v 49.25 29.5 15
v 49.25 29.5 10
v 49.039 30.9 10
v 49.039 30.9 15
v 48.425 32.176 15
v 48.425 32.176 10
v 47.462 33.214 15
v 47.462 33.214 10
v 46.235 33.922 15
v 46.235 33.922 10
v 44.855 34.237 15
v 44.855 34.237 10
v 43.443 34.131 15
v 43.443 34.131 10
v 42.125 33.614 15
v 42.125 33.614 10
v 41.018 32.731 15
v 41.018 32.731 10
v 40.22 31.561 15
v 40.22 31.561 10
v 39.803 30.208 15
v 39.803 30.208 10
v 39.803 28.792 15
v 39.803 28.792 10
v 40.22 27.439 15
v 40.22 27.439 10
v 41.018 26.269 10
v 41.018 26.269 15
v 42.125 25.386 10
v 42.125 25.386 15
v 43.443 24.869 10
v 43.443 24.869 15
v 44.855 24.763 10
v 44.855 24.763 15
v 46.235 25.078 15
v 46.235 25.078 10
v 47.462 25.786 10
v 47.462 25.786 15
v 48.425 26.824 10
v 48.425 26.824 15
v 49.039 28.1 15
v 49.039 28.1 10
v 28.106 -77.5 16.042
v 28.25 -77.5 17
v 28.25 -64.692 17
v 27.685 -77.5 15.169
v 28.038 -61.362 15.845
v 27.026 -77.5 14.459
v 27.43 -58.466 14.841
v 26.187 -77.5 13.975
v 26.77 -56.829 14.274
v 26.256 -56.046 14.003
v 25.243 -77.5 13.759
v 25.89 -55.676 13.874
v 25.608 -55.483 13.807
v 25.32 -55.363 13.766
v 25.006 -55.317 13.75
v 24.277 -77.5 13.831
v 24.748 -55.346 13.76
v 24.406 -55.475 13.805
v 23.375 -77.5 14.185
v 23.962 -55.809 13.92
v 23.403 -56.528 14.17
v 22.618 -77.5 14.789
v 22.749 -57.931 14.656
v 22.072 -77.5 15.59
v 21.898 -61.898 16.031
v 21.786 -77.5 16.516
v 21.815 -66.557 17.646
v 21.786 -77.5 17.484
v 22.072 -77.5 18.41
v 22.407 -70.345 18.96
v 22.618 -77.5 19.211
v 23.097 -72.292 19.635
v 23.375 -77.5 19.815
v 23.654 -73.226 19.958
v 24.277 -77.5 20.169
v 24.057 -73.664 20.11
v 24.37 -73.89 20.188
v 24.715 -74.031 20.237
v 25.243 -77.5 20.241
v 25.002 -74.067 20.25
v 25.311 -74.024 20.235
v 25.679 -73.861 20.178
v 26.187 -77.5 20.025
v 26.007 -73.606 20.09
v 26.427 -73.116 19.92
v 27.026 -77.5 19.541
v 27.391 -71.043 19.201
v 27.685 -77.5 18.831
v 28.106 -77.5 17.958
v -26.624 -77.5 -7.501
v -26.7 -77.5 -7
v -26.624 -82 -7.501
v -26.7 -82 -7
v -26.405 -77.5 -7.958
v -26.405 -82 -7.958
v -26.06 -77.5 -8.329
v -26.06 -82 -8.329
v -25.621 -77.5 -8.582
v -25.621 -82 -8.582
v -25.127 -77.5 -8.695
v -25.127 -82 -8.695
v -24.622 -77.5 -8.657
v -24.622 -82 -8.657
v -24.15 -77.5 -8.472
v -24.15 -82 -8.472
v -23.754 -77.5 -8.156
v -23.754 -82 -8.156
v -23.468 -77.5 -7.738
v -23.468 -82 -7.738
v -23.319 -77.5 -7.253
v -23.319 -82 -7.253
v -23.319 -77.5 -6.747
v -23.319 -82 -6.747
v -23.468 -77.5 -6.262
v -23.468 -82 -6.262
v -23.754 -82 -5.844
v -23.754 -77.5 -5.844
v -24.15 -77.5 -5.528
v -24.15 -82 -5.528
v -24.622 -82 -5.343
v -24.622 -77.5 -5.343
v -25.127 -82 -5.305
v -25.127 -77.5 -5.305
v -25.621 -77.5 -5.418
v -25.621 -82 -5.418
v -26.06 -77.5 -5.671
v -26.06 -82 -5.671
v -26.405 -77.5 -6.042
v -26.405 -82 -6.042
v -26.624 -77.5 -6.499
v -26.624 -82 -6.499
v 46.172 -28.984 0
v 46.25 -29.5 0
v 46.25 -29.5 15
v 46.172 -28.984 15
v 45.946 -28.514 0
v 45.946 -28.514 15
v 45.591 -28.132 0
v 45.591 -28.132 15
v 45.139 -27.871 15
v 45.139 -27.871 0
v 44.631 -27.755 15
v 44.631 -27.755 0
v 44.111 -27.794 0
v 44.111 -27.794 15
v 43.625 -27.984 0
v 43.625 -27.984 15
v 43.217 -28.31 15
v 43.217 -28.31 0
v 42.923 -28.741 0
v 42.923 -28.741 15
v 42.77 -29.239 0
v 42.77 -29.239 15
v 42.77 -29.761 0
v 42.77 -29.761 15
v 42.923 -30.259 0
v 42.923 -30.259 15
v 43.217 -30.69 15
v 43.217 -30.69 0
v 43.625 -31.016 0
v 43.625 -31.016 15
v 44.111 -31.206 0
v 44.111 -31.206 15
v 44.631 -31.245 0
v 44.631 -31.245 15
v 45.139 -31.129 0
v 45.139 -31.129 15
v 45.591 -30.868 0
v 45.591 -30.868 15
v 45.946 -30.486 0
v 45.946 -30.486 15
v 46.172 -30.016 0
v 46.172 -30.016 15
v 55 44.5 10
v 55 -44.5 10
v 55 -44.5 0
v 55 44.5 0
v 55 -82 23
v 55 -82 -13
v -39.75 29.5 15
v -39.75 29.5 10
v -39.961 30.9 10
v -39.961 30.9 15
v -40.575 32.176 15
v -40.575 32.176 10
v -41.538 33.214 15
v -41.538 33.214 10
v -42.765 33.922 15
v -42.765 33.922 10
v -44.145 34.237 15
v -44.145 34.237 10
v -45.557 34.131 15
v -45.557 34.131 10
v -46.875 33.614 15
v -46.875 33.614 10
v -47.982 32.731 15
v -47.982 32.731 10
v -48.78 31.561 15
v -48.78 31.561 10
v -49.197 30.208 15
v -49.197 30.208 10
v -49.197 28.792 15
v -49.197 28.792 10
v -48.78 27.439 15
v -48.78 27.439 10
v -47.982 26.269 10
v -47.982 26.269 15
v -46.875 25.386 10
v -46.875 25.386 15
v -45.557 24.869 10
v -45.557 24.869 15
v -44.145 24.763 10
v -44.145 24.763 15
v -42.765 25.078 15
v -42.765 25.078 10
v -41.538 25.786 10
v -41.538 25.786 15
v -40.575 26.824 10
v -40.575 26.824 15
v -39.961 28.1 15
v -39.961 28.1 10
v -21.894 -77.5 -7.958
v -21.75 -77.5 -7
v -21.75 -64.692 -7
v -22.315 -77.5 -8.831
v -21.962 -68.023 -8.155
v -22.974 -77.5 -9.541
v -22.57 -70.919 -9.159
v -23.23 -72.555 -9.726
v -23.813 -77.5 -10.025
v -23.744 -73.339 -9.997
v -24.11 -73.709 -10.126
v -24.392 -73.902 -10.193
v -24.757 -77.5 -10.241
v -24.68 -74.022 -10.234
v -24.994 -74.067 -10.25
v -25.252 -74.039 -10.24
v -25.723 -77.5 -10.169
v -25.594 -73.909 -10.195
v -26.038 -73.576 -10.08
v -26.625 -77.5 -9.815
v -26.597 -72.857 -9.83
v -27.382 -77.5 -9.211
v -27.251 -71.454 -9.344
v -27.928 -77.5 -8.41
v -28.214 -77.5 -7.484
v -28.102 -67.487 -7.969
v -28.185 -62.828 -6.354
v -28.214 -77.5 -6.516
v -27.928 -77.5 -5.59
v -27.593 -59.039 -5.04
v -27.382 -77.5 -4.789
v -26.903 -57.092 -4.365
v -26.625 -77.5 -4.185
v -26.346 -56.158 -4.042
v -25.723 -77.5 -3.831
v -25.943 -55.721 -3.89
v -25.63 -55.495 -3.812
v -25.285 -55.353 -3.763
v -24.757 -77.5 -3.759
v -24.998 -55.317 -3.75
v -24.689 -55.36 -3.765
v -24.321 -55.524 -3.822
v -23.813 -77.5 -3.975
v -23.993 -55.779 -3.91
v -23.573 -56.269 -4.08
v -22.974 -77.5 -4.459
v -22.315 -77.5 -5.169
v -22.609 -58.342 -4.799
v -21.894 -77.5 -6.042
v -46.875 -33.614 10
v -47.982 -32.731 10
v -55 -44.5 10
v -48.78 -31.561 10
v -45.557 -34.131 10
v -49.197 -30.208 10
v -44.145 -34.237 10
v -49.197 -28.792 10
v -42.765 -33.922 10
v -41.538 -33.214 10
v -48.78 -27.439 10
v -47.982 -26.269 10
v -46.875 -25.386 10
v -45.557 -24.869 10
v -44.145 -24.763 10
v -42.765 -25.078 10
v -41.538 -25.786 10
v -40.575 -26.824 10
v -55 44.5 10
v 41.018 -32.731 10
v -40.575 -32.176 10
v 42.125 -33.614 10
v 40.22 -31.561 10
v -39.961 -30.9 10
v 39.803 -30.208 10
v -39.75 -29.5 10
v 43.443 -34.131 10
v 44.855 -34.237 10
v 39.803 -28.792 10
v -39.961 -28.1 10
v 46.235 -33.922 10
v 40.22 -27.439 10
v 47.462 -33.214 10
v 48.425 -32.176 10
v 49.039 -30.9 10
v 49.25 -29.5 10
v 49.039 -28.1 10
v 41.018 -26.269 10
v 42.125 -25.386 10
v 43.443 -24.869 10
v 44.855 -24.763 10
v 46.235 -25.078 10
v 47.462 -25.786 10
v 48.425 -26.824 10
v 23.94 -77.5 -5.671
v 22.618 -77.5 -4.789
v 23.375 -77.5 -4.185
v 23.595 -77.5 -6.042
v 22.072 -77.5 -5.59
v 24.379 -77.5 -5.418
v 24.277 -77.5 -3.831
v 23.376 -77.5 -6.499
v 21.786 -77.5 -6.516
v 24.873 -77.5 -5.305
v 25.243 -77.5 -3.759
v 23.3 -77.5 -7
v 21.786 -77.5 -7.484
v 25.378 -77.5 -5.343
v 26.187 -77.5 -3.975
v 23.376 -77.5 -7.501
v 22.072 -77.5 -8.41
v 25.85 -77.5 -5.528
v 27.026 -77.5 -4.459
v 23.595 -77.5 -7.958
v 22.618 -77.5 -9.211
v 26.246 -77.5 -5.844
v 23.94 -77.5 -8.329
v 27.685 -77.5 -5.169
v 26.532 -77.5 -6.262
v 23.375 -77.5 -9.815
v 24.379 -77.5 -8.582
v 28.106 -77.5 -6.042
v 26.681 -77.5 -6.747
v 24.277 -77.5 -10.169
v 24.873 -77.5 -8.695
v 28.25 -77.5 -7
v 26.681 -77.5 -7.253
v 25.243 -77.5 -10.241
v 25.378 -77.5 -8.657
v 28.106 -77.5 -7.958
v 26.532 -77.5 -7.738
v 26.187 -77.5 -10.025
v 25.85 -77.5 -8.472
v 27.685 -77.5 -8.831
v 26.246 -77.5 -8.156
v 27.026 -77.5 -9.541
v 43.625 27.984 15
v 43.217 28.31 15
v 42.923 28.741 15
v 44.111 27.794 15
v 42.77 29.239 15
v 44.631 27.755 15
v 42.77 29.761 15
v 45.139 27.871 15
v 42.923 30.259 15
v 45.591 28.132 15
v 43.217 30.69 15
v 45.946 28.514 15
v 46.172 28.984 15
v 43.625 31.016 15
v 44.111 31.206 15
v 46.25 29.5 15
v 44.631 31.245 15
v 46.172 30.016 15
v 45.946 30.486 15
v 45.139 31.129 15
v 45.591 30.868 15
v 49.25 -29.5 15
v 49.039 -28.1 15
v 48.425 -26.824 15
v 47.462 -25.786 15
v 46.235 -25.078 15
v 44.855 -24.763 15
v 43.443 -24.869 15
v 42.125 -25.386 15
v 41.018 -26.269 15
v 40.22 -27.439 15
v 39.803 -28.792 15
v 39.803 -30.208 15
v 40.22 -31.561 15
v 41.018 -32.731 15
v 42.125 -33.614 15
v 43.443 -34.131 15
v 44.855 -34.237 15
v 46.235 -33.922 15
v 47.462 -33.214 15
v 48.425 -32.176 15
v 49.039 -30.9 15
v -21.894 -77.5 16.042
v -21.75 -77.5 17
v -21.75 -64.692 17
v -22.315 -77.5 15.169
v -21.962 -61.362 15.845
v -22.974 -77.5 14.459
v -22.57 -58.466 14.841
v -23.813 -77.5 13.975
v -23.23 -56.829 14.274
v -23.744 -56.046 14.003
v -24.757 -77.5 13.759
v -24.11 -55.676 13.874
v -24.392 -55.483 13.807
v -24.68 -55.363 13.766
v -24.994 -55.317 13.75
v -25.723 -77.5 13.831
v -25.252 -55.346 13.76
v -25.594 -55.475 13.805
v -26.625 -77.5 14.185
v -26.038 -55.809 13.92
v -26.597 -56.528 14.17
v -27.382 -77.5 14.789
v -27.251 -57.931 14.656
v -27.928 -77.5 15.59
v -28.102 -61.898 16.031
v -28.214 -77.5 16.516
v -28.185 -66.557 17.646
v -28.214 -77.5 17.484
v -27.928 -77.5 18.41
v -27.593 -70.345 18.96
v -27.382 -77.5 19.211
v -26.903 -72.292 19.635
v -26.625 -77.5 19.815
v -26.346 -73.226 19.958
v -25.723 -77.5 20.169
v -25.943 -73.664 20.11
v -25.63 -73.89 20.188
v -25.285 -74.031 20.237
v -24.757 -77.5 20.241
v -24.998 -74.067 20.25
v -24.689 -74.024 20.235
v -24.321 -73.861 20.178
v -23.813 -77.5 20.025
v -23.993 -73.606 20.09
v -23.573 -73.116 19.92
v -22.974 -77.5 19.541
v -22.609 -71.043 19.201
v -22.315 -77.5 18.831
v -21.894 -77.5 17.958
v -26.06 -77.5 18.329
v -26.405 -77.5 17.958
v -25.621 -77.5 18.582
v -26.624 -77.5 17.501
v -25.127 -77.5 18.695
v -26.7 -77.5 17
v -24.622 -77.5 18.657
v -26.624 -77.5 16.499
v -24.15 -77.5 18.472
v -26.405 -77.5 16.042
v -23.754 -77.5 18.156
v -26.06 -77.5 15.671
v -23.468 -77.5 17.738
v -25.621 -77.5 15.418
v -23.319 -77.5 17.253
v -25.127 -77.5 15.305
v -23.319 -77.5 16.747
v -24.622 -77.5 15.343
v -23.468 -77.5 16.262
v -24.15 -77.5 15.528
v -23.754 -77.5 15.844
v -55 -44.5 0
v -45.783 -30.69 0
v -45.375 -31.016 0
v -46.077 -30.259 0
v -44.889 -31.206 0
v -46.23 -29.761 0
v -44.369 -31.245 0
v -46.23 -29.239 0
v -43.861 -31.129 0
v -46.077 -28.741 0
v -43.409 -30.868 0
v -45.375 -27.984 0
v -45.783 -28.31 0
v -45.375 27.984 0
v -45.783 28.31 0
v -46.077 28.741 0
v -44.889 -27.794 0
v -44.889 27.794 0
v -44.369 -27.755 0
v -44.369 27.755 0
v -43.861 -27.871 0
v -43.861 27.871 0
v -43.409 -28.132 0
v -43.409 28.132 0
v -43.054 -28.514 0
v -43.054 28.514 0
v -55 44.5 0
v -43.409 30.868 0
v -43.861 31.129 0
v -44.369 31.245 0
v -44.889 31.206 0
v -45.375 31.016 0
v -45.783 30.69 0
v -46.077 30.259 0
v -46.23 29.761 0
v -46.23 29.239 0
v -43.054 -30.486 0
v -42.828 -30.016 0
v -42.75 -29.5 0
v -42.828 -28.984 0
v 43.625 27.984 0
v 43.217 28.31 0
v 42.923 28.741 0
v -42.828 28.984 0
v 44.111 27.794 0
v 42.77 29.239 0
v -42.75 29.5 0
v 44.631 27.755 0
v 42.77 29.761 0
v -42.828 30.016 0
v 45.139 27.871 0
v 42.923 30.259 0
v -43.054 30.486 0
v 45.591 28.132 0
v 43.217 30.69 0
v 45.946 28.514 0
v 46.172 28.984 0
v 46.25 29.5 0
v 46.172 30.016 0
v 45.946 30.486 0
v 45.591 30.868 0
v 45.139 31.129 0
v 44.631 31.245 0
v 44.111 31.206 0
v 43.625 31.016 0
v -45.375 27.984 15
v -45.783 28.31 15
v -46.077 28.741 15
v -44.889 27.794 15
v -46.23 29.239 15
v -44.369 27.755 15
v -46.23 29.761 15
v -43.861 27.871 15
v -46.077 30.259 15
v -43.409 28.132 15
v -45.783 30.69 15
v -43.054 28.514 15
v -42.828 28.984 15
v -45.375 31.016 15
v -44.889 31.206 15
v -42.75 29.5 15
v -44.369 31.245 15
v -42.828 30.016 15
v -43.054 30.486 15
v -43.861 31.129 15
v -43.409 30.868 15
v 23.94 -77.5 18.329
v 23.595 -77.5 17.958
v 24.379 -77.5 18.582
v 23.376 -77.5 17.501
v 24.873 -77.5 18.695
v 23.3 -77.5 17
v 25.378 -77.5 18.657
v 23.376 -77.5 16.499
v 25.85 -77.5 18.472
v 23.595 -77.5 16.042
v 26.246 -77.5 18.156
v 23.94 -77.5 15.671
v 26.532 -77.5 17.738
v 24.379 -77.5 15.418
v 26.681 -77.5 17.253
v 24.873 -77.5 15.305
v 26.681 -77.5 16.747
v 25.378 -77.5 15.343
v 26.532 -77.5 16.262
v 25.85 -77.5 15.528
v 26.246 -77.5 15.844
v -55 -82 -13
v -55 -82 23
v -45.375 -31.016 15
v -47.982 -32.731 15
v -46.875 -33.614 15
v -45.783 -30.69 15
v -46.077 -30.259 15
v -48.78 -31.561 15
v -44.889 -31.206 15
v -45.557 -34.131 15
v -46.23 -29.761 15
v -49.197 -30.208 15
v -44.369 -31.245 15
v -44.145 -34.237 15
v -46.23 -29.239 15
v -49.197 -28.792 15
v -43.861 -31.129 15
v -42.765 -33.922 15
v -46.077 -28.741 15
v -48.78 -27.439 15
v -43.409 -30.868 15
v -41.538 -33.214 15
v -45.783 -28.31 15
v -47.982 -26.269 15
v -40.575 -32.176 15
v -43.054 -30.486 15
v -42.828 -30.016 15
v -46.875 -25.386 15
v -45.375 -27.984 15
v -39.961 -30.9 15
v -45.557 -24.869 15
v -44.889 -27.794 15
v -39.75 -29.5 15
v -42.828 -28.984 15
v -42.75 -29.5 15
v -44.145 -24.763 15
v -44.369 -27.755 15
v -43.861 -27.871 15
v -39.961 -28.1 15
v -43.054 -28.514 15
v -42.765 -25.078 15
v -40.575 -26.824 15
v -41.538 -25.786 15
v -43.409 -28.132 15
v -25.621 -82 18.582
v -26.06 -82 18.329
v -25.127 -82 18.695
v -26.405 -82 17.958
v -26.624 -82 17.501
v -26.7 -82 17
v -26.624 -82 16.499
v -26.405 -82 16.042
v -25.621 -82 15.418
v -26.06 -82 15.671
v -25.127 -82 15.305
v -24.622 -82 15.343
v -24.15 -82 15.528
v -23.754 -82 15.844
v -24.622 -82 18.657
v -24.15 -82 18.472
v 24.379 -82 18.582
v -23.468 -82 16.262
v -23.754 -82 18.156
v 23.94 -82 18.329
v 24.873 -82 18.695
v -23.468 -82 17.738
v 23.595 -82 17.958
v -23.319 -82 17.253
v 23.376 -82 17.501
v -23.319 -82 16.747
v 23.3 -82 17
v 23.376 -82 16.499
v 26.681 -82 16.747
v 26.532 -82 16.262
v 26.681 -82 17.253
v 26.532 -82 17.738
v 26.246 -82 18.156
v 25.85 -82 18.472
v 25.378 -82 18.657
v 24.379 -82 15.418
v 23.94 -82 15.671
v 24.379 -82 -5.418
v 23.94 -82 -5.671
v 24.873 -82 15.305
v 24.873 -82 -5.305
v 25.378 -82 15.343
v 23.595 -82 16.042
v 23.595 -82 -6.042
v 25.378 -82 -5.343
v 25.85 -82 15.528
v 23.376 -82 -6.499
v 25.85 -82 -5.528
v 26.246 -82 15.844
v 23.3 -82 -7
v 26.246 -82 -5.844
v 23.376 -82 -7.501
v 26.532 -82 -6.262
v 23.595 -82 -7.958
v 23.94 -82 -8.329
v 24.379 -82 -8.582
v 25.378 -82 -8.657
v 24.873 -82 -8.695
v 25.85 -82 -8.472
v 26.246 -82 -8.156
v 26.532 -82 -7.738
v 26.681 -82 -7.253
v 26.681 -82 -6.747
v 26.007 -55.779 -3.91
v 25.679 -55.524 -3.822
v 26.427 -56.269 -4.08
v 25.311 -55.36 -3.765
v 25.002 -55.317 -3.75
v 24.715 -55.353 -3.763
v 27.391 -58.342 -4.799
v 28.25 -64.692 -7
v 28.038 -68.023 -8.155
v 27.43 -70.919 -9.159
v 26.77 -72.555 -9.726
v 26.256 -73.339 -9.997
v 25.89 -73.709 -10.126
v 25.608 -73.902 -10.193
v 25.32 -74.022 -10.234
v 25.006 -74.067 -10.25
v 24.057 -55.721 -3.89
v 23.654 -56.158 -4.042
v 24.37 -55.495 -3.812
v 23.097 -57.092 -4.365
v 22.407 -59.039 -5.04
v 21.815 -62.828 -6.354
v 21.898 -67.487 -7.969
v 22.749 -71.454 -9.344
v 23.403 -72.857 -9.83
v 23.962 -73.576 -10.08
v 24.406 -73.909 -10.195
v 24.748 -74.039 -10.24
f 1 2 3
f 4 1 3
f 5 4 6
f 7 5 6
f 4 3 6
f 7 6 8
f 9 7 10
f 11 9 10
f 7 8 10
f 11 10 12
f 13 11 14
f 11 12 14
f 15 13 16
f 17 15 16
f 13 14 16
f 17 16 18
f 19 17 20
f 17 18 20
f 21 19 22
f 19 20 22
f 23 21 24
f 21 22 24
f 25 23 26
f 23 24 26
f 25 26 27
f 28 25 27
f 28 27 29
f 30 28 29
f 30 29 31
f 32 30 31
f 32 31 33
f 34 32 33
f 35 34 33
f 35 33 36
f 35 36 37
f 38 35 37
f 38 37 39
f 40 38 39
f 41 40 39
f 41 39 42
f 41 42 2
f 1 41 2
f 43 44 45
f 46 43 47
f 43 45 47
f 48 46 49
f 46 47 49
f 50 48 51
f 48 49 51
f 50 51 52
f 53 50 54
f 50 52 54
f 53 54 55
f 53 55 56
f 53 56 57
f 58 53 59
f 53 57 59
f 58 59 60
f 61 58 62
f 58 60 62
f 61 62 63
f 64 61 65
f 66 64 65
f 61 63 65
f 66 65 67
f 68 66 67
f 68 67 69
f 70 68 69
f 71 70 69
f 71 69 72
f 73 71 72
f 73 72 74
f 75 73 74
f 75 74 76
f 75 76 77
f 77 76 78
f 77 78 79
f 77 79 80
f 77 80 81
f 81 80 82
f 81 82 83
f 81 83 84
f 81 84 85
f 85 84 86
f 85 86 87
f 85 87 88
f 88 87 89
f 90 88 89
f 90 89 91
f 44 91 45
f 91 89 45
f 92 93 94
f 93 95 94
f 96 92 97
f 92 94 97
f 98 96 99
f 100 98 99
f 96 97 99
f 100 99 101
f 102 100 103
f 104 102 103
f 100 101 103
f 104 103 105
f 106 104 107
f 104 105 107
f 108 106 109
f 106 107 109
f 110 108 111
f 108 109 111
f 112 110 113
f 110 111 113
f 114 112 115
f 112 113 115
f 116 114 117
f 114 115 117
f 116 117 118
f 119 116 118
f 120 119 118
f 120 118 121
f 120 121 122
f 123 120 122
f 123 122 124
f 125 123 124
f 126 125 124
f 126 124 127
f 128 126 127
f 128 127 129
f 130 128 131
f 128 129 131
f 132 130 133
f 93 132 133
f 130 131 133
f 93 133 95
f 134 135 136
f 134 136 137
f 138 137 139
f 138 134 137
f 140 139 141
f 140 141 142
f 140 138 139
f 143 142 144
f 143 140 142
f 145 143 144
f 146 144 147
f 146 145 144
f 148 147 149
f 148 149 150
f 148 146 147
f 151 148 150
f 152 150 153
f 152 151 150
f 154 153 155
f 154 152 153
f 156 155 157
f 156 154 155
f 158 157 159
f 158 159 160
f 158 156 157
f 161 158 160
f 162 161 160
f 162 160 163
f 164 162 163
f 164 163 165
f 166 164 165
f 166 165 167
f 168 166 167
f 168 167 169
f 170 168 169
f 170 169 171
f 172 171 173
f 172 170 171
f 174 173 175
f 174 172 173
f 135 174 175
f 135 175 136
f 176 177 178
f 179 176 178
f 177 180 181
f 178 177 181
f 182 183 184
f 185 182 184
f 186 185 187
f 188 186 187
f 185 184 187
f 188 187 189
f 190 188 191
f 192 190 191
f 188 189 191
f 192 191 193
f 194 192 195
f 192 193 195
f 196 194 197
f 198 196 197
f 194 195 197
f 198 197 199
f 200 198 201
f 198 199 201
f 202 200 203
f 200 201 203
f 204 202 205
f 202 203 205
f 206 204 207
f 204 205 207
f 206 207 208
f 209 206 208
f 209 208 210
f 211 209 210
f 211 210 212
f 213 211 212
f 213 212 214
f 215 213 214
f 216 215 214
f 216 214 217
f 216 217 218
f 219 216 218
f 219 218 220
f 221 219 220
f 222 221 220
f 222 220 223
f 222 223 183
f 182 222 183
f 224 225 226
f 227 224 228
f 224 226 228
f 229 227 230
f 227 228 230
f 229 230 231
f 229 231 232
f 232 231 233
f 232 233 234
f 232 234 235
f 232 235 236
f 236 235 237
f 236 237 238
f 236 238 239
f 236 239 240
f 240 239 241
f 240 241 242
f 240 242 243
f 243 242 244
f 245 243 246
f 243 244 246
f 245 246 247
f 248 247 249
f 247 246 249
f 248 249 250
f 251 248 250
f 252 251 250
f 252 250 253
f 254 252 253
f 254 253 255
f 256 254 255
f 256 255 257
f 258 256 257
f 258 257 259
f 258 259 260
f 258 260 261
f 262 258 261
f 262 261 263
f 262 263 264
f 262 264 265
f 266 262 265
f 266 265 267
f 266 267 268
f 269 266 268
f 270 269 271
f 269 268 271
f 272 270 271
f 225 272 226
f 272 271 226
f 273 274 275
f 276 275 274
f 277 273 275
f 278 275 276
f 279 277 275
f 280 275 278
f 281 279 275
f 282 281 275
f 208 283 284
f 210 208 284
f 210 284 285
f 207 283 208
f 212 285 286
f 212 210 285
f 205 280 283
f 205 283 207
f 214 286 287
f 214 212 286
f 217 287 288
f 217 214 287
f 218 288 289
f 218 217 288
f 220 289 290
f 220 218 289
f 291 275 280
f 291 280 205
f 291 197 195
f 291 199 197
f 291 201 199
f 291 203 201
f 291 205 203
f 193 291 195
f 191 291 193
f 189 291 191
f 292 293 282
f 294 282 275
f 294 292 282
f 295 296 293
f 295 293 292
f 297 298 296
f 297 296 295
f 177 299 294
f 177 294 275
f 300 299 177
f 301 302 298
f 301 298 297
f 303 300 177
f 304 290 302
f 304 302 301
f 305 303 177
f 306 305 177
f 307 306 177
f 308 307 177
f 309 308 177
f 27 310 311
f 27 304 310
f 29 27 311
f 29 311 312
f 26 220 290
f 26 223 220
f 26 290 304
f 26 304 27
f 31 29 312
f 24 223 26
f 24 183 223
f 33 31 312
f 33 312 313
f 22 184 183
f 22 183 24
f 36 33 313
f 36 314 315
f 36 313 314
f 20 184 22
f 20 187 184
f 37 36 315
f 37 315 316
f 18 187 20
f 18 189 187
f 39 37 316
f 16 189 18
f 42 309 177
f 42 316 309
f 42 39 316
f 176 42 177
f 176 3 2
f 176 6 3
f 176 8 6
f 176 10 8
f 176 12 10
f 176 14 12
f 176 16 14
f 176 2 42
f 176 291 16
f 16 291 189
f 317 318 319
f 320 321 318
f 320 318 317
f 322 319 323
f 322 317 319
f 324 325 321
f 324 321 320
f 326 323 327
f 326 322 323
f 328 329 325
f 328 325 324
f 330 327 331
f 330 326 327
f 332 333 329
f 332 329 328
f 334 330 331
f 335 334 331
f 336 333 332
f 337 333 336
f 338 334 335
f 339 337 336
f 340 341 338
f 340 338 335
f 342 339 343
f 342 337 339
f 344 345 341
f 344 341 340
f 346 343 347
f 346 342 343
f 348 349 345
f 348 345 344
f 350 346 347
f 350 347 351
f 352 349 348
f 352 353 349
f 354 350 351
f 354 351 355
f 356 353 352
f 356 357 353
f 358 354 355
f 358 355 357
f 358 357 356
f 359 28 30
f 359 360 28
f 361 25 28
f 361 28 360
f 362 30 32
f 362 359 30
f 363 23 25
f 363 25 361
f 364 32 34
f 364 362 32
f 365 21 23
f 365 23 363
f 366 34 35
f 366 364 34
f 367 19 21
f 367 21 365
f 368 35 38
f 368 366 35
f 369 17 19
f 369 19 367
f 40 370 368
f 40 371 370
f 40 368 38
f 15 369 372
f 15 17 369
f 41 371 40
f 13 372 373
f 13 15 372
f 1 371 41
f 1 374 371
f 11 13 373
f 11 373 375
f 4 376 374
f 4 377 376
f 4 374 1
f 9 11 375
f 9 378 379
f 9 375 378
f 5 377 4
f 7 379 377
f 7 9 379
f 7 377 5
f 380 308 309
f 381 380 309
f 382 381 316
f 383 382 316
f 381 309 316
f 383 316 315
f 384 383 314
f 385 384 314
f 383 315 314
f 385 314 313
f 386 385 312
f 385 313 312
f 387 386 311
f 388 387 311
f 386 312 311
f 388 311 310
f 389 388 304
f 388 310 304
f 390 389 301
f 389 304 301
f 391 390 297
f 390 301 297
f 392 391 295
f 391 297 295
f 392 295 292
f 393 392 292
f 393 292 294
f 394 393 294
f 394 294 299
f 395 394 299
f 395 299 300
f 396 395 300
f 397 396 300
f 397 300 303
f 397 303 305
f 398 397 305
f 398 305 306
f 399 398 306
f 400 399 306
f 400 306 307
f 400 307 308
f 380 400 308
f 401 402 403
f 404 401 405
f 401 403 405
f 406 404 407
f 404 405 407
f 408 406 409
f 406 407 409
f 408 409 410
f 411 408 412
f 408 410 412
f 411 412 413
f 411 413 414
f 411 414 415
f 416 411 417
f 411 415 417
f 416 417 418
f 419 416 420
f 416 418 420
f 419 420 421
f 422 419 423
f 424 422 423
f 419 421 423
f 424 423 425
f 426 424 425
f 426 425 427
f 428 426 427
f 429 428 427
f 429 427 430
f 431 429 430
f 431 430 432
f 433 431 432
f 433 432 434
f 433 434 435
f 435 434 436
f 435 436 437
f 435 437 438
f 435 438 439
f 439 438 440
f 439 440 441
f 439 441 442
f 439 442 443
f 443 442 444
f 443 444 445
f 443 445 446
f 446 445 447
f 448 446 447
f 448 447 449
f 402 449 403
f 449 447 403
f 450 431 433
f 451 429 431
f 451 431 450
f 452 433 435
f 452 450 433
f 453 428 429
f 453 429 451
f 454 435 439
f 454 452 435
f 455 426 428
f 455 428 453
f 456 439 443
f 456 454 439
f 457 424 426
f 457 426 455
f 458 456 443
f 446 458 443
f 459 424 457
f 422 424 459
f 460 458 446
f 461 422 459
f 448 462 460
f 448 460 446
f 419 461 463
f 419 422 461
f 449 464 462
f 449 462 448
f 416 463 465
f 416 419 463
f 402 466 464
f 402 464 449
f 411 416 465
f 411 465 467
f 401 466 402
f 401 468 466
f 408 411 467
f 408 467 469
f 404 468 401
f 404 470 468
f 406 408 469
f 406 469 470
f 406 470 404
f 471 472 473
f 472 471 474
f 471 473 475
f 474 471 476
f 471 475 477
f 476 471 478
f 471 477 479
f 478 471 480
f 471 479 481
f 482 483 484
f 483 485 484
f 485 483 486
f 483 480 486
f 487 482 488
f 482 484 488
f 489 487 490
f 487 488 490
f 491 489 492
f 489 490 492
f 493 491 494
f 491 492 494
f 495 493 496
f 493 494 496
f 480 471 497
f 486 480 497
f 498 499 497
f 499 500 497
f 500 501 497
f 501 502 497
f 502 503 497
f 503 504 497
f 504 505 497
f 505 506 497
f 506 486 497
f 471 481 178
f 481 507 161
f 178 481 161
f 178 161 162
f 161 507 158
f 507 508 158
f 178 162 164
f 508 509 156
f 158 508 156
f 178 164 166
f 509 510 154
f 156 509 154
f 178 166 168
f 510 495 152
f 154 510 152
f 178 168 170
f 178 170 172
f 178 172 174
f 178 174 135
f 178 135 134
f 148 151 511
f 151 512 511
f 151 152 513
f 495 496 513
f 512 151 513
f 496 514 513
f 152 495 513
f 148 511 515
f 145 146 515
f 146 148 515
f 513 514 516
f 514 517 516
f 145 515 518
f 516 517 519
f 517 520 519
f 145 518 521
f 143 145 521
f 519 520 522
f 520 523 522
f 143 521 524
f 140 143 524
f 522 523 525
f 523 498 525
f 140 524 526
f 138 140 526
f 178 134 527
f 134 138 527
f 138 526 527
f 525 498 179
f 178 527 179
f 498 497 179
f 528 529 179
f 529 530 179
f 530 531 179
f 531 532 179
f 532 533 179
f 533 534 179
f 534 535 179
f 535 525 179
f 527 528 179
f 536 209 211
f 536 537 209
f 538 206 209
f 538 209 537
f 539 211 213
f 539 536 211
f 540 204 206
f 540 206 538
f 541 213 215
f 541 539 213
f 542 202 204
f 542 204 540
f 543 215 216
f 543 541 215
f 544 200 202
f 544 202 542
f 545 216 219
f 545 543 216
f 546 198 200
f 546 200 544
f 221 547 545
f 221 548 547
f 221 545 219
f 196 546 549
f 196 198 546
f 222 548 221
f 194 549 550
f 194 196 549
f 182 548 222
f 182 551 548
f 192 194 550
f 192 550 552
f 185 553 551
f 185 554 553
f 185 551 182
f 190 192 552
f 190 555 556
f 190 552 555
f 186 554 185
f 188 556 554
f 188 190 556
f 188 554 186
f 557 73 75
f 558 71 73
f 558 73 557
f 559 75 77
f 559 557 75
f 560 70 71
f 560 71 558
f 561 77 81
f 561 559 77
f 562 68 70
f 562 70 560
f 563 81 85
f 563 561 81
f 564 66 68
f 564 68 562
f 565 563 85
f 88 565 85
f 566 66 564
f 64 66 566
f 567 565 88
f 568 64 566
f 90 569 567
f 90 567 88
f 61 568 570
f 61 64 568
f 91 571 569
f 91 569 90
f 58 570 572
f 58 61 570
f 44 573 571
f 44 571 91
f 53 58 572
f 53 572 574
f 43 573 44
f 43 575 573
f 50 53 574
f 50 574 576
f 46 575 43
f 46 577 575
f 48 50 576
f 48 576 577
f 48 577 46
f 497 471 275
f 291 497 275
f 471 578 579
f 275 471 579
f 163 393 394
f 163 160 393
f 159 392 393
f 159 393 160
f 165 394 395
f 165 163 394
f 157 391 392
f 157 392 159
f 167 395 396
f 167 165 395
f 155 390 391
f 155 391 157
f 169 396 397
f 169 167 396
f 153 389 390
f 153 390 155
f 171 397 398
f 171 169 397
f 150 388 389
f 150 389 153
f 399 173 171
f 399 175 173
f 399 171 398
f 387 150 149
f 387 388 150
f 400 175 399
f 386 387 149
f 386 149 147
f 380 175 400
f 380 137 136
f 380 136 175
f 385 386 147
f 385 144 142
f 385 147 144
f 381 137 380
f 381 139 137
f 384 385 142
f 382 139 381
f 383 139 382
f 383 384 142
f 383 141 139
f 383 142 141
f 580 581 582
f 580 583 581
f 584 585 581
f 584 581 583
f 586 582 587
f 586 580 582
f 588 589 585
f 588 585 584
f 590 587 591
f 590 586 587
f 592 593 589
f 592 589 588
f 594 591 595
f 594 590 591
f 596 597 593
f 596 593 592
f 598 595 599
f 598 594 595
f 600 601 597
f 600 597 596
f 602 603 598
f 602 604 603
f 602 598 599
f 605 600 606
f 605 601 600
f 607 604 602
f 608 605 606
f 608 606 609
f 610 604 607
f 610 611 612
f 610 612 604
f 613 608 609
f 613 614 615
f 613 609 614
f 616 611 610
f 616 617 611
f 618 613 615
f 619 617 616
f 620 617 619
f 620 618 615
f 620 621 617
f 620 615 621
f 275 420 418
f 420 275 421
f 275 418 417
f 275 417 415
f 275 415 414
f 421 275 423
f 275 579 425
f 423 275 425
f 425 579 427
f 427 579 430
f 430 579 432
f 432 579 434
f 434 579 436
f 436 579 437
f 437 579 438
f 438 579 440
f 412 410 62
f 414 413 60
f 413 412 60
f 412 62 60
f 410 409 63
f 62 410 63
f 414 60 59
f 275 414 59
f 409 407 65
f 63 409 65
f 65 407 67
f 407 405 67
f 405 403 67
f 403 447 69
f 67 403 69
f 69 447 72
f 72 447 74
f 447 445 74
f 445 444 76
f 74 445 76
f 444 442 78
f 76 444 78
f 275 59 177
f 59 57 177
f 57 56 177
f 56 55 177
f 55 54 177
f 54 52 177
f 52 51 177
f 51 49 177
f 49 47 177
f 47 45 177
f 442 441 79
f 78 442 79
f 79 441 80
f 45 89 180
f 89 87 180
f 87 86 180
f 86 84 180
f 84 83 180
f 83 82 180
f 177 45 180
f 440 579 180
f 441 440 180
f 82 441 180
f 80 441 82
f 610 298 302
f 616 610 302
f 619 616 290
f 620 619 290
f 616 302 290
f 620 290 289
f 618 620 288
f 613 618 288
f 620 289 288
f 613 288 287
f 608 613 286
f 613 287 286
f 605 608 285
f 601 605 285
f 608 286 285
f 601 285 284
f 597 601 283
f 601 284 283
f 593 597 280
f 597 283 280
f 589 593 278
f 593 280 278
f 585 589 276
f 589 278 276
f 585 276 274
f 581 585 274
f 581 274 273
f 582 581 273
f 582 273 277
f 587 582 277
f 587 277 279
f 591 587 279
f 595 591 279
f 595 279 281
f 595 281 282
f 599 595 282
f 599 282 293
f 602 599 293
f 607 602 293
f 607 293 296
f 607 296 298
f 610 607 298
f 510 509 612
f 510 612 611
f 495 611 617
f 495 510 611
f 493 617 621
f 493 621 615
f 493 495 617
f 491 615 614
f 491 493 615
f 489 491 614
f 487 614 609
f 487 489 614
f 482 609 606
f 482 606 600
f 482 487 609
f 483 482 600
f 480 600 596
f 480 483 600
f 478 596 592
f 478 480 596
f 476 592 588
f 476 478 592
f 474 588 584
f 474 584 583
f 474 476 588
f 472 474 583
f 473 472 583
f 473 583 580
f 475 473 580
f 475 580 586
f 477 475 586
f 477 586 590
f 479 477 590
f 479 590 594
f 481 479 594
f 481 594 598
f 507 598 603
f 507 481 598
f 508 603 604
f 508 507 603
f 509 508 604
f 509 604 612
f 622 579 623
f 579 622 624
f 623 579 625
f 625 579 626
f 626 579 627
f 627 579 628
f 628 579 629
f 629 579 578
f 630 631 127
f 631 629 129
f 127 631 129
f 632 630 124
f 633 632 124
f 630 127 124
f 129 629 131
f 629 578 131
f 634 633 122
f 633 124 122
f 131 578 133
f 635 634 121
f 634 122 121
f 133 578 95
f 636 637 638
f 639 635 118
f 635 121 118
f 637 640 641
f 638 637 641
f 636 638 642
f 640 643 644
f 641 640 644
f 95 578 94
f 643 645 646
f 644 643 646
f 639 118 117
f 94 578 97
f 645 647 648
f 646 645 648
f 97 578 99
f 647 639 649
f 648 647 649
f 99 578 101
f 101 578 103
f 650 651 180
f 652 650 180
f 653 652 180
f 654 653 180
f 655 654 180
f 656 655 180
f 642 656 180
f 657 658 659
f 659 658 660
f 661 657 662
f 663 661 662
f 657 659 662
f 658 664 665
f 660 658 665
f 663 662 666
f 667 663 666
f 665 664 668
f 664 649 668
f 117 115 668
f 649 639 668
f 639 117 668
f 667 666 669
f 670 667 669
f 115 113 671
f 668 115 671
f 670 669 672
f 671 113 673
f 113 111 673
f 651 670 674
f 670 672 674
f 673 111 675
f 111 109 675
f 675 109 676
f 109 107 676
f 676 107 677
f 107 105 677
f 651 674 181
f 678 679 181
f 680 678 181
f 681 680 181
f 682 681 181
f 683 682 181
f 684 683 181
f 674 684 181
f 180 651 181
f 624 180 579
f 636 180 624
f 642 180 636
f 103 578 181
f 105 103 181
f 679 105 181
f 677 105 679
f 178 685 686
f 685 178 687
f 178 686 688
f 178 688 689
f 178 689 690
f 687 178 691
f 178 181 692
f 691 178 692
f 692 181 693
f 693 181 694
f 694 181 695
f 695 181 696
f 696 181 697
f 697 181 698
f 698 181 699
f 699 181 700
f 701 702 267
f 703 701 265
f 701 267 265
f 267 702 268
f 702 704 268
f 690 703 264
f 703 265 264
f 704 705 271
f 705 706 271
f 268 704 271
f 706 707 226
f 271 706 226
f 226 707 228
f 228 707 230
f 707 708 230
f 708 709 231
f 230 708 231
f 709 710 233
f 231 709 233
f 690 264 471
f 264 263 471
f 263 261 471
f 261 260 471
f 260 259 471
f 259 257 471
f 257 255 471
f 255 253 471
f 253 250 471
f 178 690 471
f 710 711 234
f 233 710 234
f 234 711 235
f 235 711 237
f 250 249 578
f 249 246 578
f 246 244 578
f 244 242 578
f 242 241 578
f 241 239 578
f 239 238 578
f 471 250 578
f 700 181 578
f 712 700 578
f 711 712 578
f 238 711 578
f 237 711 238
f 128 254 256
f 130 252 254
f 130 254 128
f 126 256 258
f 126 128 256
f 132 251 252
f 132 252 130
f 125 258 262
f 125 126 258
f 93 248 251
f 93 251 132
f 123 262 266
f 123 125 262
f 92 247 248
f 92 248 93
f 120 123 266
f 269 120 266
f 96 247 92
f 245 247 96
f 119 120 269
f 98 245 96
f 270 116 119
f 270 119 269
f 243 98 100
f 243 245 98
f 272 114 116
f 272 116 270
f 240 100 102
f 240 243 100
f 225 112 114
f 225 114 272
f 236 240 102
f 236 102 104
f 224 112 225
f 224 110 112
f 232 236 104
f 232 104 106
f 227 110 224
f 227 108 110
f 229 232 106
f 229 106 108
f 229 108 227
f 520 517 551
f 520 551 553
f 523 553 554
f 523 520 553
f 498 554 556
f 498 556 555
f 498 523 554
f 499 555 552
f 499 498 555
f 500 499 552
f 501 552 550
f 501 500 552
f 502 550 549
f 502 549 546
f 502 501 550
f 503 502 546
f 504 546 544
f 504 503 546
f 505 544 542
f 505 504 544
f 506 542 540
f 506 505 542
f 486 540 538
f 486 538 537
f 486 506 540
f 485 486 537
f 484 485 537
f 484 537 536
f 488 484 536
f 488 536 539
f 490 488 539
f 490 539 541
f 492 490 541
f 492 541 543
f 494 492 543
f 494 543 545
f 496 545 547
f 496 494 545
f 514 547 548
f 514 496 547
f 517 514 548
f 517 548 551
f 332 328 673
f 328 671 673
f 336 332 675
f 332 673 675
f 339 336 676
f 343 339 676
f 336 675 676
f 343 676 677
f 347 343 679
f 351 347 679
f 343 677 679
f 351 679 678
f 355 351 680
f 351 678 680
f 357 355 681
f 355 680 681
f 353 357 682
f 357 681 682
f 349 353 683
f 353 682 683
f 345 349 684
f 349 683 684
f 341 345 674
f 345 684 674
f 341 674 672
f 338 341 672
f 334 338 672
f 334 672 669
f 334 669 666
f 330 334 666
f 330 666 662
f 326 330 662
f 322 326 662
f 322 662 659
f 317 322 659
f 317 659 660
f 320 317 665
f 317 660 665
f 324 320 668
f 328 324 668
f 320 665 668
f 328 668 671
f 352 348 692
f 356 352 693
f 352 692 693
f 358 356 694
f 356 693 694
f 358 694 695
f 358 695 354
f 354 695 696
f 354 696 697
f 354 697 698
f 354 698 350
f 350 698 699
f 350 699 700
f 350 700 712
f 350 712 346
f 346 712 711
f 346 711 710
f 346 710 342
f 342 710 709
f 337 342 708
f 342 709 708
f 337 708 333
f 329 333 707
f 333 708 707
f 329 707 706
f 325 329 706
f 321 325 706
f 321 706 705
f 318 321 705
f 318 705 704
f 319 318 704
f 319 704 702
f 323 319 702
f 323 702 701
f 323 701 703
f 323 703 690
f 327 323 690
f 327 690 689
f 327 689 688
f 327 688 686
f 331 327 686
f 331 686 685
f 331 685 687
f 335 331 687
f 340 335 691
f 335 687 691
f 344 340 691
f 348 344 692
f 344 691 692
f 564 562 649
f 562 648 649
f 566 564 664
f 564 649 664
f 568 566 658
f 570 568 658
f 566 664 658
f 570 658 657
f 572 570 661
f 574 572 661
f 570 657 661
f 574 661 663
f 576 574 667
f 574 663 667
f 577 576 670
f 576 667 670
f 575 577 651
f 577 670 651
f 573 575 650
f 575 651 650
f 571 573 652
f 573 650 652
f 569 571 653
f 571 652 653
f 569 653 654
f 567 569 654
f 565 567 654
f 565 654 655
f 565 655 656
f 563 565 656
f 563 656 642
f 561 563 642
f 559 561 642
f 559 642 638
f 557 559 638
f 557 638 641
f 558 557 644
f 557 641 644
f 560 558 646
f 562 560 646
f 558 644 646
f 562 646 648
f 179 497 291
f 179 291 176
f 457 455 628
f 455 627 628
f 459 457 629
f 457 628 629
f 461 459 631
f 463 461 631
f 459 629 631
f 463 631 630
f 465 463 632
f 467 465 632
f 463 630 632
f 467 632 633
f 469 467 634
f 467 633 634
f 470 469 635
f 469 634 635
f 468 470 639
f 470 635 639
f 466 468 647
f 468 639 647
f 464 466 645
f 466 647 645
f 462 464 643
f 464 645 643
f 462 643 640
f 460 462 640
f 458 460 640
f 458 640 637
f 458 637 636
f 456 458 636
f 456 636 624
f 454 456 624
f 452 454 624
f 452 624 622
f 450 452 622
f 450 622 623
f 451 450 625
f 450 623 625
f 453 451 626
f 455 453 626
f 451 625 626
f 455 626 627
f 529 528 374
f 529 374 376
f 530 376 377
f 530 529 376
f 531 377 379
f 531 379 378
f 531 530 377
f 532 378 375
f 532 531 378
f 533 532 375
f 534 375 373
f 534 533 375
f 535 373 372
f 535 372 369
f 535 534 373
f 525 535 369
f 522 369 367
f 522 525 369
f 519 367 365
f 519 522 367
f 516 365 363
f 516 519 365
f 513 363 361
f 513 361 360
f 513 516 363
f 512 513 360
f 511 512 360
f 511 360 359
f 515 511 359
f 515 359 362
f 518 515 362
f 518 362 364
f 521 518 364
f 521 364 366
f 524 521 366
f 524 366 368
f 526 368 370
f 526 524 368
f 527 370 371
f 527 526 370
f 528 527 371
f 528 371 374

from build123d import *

# Parameters (mm, degrees)
SKETCH1_W                      = 110
SKETCH1_H                      = 89
SKETCH1_R                      = 4.75
BOSS_EXTRUDE1_DEPTH            = 10
SKETCH1_3_R                    = 4.75
SKETCH1_3_R_2                  = 1.75
BOSS_EXTRUDE2_DEPTH            = 15
SKETCH2_W                      = 110
SKETCH2_H                      = 36
CBORE_FOR_M3_SHCS1_D           = 3.4
CBORE_FOR_M3_SHCS1_CBORE_D     = 6.5
CBORE_FOR_M3_SHCS1_CBORE_DEPTH = 33


with BuildPart() as part:
    # Sketch1 → Boss-Extrude1 (new body)
    with BuildSketch(Plane.XY):
        Rectangle(SKETCH1_W, SKETCH1_H)
        with Locations((44.5, 29.5)):
            Circle(SKETCH1_R, mode=Mode.SUBTRACT)
        with Locations((44.5, -29.5)):
            Circle(SKETCH1_R, mode=Mode.SUBTRACT)
        with Locations((-44.5, -29.5)):
            Circle(SKETCH1_R, mode=Mode.SUBTRACT)
        with Locations((-44.5, 29.5)):
            Circle(SKETCH1_R, mode=Mode.SUBTRACT)
    extrude(amount=BOSS_EXTRUDE1_DEPTH)

    # Sketch1<3> → Boss-Extrude2 (add)
    with BuildSketch(Plane.XY):
        with Locations((-44.5, 29.5)):
            Circle(SKETCH1_3_R)
        with Locations((-44.5, 29.5)):
            Circle(SKETCH1_3_R_2, mode=Mode.SUBTRACT)
        with Locations((44.5, 29.5)):
            Circle(SKETCH1_3_R)
        with Locations((44.5, 29.5)):
            Circle(SKETCH1_3_R_2, mode=Mode.SUBTRACT)
        with Locations((44.5, -29.5)):
            Circle(SKETCH1_3_R)
        with Locations((44.5, -29.5)):
            Circle(SKETCH1_3_R_2, mode=Mode.SUBTRACT)
        with Locations((-44.5, -29.5)):
            Circle(SKETCH1_3_R)
        with Locations((-44.5, -29.5)):
            Circle(SKETCH1_3_R_2, mode=Mode.SUBTRACT)
    extrude(amount=BOSS_EXTRUDE2_DEPTH)

    # Sketch2 → section 1 of loft1
    with BuildSketch(Plane(origin=(0, -82, 0), x_dir=(1, 0, 0), z_dir=(0, 1, 0)), mode=Mode.PRIVATE) as loft1_s1:
        with Locations((0, -5)):
            Rectangle(SKETCH2_W, SKETCH2_H)
    # loft from a face of the part (loft1)
    loft([part.faces().sort_by_distance((0, -44.5, 5))[0], loft1_s1.sketch])

    # CBORE for M3 SHCS1 (through all)
    with Locations(Plane(origin=(0, -44.5, 0), x_dir=(1, 0, 0), z_dir=(0, 1, 0))):
        with Locations((-25, 7), (25, 7), (25, -17), (-25, -17)):
            CounterBoreHole(CBORE_FOR_M3_SHCS1_D / 2, CBORE_FOR_M3_SHCS1_CBORE_D / 2, CBORE_FOR_M3_SHCS1_CBORE_DEPTH)


solid = part.part
